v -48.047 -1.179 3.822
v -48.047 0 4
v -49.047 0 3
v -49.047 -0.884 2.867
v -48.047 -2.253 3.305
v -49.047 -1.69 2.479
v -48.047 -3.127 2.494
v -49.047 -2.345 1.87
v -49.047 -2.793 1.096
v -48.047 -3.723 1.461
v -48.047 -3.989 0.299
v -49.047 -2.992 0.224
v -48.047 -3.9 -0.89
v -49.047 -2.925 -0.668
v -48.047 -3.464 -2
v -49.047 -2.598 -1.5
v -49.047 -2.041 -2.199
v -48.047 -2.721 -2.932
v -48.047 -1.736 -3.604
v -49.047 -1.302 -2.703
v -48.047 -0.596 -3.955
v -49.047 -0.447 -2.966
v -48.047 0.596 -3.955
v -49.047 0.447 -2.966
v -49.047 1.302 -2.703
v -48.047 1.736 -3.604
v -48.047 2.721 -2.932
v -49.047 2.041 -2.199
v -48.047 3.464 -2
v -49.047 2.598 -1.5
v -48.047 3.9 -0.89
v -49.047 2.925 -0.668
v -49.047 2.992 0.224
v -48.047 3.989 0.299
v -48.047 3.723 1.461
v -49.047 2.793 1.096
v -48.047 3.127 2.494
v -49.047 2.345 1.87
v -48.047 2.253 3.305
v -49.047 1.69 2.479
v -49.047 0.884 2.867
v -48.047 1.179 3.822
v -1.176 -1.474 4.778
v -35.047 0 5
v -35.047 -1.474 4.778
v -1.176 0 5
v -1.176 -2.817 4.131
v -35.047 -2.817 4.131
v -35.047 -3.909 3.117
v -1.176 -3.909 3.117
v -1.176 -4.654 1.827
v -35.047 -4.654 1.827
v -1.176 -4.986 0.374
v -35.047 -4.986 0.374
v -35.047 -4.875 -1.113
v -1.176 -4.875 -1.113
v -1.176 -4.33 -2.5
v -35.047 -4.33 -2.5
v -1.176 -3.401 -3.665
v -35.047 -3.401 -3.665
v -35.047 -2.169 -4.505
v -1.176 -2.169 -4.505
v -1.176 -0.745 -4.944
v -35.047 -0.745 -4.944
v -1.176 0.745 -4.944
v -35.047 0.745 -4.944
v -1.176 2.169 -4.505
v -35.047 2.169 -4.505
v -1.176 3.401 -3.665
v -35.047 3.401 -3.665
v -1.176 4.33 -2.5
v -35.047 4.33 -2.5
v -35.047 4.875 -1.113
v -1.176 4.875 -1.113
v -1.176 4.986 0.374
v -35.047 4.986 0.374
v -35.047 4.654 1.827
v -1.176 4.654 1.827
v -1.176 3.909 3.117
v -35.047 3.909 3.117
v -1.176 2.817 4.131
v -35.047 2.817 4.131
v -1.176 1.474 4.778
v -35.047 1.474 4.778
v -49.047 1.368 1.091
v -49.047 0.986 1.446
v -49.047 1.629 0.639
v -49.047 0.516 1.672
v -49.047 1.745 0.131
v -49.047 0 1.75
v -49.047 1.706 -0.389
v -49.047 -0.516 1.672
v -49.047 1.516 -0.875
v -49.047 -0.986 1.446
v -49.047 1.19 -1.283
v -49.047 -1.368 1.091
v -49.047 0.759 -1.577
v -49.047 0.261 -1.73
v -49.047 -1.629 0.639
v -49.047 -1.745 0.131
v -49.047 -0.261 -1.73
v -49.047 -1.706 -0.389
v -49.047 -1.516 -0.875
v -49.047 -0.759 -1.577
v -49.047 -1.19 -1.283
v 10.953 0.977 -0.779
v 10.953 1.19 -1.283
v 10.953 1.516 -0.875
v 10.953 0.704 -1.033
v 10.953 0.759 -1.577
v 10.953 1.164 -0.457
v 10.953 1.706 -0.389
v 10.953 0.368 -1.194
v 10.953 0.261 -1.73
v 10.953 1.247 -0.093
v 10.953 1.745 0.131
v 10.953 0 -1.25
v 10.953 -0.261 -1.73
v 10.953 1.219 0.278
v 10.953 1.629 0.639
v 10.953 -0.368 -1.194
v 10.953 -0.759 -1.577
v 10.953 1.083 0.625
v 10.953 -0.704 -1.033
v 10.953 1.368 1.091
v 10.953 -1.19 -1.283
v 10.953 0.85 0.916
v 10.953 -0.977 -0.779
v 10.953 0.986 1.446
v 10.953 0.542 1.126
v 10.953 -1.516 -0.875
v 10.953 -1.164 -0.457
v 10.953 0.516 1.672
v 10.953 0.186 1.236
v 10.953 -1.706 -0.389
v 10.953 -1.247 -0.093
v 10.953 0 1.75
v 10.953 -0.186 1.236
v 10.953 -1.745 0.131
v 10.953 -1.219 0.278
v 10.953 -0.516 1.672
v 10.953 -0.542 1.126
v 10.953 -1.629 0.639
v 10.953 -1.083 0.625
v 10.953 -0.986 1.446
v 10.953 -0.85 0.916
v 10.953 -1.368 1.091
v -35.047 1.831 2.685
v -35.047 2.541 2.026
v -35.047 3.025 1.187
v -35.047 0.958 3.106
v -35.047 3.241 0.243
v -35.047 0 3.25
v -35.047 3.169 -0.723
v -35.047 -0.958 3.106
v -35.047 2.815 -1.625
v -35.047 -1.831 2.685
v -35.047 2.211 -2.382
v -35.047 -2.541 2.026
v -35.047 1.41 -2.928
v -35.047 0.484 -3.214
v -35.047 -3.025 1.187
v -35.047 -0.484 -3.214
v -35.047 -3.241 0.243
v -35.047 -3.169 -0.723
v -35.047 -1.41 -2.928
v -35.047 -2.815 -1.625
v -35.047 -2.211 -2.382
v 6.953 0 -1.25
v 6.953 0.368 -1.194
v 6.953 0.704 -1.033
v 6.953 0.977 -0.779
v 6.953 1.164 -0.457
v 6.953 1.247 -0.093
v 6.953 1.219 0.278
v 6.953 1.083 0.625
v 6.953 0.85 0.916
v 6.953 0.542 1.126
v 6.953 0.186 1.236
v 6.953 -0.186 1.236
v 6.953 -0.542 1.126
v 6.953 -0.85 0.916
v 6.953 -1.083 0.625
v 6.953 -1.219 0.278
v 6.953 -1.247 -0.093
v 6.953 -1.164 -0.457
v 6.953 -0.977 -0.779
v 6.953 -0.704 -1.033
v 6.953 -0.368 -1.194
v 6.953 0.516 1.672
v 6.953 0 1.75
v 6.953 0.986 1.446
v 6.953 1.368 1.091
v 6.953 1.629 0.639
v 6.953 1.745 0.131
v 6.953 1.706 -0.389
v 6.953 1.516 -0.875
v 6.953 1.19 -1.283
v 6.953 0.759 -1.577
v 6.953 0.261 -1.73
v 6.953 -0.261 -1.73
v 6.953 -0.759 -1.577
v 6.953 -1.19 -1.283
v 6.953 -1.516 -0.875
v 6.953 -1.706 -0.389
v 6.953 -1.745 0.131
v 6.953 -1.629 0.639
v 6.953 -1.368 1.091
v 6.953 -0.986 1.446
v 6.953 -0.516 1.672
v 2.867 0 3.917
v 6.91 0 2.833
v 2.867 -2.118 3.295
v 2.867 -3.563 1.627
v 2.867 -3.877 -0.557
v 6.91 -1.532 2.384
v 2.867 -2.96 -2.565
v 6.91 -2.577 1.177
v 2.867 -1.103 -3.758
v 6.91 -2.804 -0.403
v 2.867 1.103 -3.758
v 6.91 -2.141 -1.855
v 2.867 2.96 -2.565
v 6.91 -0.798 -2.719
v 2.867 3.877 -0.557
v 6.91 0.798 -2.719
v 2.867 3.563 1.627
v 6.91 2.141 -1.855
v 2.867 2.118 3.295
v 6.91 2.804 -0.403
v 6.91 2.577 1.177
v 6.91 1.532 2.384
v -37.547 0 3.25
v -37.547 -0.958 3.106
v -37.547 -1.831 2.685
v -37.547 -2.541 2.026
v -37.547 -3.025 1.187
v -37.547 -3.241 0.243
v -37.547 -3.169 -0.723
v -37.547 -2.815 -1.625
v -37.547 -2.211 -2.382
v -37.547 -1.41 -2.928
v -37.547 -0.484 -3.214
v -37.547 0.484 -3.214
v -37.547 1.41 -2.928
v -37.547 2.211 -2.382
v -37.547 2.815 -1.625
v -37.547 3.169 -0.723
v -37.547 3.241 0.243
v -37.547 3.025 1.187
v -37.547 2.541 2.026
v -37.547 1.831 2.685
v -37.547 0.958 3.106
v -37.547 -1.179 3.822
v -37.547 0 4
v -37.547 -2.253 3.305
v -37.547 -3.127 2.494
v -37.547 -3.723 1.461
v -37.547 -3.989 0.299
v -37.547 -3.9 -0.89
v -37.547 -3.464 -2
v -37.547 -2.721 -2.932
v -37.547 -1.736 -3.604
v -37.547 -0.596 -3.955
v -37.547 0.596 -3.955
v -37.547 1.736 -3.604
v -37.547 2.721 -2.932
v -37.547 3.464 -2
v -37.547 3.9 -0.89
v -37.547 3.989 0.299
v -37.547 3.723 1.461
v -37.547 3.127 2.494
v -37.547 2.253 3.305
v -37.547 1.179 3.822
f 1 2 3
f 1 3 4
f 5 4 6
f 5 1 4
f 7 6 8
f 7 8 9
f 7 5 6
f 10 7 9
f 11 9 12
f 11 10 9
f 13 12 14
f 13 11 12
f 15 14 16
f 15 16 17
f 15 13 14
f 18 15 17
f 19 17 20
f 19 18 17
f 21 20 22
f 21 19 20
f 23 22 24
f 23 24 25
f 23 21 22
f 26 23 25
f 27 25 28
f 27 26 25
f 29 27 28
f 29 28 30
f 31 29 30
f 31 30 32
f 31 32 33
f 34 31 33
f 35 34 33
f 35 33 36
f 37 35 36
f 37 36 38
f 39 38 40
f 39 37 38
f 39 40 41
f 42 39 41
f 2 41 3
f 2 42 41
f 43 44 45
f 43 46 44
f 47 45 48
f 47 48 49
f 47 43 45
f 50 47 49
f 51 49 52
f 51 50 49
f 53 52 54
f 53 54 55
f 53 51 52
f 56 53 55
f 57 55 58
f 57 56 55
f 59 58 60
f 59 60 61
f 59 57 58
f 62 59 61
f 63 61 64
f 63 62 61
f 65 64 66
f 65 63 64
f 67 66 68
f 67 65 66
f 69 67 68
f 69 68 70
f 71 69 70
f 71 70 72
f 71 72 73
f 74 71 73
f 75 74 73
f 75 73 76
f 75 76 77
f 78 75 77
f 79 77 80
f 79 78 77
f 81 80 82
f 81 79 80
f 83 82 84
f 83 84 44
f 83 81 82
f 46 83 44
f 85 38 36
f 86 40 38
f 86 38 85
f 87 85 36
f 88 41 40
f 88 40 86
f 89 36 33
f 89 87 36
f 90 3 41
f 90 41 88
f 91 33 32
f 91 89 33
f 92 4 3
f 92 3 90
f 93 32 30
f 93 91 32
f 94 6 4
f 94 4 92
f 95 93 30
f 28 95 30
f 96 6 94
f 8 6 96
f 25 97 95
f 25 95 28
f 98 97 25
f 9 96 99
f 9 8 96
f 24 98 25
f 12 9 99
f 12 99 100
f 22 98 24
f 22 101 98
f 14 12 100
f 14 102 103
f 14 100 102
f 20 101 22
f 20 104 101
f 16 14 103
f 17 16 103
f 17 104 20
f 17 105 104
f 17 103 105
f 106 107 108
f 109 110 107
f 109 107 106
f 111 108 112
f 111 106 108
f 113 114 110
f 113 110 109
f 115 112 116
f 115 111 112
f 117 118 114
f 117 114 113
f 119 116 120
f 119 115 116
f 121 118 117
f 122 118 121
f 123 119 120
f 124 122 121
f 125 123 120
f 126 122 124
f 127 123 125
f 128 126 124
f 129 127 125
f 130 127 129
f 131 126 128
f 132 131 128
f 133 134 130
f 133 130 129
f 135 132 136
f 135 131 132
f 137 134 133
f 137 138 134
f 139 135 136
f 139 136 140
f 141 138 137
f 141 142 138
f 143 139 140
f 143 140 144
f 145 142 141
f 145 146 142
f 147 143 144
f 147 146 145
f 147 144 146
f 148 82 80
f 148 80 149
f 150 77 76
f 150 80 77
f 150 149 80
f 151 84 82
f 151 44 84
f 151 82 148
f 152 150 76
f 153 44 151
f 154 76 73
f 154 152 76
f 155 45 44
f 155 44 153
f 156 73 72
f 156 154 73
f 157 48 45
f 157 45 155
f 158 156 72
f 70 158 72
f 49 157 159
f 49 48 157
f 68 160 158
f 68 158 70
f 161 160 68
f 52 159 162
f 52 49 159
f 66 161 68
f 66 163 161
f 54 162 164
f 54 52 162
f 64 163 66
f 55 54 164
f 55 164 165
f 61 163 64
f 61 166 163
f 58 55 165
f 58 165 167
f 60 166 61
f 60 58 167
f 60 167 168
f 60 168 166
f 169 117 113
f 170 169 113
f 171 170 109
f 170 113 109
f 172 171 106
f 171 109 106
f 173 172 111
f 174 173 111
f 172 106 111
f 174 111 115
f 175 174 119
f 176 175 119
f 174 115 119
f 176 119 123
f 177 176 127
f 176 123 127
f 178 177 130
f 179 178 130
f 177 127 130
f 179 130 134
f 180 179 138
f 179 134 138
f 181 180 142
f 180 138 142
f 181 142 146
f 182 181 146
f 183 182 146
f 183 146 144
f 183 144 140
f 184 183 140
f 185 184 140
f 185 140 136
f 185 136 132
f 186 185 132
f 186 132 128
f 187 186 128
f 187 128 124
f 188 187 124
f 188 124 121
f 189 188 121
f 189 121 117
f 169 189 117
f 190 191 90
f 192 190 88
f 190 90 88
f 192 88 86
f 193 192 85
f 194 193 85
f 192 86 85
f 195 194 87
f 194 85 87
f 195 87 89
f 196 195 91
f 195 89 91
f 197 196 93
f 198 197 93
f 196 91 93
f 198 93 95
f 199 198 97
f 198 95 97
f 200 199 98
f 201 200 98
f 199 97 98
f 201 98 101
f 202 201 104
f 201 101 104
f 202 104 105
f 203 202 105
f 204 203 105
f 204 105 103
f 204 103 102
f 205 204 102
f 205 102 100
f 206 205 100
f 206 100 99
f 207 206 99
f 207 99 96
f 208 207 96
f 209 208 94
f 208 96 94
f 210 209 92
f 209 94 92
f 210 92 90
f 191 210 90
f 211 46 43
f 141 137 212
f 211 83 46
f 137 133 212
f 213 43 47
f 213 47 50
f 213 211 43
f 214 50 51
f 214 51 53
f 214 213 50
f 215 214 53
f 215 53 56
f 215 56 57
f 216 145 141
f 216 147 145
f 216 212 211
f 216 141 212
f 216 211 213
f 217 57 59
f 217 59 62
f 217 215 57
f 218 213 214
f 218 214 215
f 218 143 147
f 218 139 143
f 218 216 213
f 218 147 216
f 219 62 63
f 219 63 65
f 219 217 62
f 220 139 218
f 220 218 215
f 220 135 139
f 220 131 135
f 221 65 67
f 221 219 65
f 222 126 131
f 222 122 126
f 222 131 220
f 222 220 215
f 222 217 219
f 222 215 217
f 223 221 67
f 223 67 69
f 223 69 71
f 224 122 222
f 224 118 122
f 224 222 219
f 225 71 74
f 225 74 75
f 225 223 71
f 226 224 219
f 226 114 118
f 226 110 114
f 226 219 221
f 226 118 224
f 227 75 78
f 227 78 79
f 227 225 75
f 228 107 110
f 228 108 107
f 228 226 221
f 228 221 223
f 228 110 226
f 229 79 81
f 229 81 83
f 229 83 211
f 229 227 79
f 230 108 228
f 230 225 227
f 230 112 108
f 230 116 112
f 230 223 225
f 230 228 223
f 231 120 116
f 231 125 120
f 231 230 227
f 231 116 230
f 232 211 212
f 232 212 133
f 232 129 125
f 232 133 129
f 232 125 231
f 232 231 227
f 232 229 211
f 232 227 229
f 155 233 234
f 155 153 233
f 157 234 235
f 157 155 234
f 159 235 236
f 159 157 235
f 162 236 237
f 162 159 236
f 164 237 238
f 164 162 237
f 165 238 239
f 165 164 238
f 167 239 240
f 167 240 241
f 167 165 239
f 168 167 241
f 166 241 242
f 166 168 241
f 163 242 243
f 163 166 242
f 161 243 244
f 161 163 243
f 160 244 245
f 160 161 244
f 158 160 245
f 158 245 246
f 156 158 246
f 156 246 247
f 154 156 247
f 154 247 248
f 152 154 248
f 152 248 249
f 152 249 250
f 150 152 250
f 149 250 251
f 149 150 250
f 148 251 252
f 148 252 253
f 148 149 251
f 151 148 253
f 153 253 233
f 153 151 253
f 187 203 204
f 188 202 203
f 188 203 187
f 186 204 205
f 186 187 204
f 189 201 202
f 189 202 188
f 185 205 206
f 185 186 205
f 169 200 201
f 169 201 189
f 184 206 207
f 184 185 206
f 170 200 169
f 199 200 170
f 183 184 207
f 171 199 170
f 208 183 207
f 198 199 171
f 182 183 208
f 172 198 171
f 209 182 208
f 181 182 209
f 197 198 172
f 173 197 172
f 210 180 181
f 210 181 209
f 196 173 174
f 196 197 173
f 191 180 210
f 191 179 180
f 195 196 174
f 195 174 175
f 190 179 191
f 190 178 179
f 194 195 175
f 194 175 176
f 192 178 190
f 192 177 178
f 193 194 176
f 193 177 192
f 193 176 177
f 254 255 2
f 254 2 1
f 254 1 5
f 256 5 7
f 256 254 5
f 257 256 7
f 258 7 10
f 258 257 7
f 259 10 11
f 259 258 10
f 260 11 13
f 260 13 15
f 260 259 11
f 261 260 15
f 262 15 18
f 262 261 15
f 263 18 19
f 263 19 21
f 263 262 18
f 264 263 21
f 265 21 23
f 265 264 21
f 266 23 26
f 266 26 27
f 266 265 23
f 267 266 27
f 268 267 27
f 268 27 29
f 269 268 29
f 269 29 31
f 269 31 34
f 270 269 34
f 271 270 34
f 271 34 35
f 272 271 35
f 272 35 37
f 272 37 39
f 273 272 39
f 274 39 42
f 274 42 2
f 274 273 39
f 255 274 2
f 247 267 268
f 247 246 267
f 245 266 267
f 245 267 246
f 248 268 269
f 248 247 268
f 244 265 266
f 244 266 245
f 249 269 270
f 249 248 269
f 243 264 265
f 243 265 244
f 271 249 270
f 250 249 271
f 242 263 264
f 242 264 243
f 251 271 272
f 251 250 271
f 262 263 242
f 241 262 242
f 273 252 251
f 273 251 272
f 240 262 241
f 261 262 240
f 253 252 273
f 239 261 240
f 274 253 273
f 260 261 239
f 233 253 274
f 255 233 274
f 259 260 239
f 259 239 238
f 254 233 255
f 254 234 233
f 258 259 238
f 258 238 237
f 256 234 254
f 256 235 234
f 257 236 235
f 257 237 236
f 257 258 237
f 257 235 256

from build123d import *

# Parameters (mm, degrees)
SKETCH_2_R          = 1.75
CUT_EXTRUDE_2_DEPTH = 56
SKETCH_3_R          = 1.25
CUT_EXTRUDE_3_DEPTH = 61.415229868
CHAMFER_1_SIZE      = 1


with BuildPart() as part:
    # 草图1 → 旋转2 (revolve)
    with BuildSketch(Plane.XY, mode=Mode.PRIVATE) as revolve_2_sk:
        Polygon((-8.728334407, 0), (-49.046975166, 0), (-49.046975166, 4), (-37.546975166, 4), (-37.546975166, 3.25), (-35.046975166, 3.25), (-35.046975166, 5), (-1.17614029, 5), (10.953024834, 1.75), (10.953024834, 0), align=None)
    revolve(revolve_2_sk.sketch.rotate(Axis((-15.390186902, 0, 0), (1, 0, 0)), 90), axis=Axis((-15.390186902, 0, 0), (1, 0, 0)))

    # 草图2 → 切除-拉伸2 (cut)
    with BuildSketch(Plane.ZY.offset(49.046975166)):
        Circle(SKETCH_2_R)
    extrude(amount=-CUT_EXTRUDE_2_DEPTH, mode=Mode.SUBTRACT)

    # 草图3 → 切除-拉伸3 (cut, through all)
    with BuildSketch(Plane(origin=(10.953024834, 0, 0), x_dir=(0, 0, -1), z_dir=(1, 0, 0))):
        Circle(SKETCH_3_R)
    extrude(amount=-CUT_EXTRUDE_3_DEPTH, mode=Mode.SUBTRACT)

    # 倒角1
    chamfer_1_edges = [part.edges().sort_by_distance(p)[0] for p in [
        (-49.046975166, 0, -4),
    ]]
    chamfer(chamfer_1_edges, length=CHAMFER_1_SIZE)


solid = part.part
